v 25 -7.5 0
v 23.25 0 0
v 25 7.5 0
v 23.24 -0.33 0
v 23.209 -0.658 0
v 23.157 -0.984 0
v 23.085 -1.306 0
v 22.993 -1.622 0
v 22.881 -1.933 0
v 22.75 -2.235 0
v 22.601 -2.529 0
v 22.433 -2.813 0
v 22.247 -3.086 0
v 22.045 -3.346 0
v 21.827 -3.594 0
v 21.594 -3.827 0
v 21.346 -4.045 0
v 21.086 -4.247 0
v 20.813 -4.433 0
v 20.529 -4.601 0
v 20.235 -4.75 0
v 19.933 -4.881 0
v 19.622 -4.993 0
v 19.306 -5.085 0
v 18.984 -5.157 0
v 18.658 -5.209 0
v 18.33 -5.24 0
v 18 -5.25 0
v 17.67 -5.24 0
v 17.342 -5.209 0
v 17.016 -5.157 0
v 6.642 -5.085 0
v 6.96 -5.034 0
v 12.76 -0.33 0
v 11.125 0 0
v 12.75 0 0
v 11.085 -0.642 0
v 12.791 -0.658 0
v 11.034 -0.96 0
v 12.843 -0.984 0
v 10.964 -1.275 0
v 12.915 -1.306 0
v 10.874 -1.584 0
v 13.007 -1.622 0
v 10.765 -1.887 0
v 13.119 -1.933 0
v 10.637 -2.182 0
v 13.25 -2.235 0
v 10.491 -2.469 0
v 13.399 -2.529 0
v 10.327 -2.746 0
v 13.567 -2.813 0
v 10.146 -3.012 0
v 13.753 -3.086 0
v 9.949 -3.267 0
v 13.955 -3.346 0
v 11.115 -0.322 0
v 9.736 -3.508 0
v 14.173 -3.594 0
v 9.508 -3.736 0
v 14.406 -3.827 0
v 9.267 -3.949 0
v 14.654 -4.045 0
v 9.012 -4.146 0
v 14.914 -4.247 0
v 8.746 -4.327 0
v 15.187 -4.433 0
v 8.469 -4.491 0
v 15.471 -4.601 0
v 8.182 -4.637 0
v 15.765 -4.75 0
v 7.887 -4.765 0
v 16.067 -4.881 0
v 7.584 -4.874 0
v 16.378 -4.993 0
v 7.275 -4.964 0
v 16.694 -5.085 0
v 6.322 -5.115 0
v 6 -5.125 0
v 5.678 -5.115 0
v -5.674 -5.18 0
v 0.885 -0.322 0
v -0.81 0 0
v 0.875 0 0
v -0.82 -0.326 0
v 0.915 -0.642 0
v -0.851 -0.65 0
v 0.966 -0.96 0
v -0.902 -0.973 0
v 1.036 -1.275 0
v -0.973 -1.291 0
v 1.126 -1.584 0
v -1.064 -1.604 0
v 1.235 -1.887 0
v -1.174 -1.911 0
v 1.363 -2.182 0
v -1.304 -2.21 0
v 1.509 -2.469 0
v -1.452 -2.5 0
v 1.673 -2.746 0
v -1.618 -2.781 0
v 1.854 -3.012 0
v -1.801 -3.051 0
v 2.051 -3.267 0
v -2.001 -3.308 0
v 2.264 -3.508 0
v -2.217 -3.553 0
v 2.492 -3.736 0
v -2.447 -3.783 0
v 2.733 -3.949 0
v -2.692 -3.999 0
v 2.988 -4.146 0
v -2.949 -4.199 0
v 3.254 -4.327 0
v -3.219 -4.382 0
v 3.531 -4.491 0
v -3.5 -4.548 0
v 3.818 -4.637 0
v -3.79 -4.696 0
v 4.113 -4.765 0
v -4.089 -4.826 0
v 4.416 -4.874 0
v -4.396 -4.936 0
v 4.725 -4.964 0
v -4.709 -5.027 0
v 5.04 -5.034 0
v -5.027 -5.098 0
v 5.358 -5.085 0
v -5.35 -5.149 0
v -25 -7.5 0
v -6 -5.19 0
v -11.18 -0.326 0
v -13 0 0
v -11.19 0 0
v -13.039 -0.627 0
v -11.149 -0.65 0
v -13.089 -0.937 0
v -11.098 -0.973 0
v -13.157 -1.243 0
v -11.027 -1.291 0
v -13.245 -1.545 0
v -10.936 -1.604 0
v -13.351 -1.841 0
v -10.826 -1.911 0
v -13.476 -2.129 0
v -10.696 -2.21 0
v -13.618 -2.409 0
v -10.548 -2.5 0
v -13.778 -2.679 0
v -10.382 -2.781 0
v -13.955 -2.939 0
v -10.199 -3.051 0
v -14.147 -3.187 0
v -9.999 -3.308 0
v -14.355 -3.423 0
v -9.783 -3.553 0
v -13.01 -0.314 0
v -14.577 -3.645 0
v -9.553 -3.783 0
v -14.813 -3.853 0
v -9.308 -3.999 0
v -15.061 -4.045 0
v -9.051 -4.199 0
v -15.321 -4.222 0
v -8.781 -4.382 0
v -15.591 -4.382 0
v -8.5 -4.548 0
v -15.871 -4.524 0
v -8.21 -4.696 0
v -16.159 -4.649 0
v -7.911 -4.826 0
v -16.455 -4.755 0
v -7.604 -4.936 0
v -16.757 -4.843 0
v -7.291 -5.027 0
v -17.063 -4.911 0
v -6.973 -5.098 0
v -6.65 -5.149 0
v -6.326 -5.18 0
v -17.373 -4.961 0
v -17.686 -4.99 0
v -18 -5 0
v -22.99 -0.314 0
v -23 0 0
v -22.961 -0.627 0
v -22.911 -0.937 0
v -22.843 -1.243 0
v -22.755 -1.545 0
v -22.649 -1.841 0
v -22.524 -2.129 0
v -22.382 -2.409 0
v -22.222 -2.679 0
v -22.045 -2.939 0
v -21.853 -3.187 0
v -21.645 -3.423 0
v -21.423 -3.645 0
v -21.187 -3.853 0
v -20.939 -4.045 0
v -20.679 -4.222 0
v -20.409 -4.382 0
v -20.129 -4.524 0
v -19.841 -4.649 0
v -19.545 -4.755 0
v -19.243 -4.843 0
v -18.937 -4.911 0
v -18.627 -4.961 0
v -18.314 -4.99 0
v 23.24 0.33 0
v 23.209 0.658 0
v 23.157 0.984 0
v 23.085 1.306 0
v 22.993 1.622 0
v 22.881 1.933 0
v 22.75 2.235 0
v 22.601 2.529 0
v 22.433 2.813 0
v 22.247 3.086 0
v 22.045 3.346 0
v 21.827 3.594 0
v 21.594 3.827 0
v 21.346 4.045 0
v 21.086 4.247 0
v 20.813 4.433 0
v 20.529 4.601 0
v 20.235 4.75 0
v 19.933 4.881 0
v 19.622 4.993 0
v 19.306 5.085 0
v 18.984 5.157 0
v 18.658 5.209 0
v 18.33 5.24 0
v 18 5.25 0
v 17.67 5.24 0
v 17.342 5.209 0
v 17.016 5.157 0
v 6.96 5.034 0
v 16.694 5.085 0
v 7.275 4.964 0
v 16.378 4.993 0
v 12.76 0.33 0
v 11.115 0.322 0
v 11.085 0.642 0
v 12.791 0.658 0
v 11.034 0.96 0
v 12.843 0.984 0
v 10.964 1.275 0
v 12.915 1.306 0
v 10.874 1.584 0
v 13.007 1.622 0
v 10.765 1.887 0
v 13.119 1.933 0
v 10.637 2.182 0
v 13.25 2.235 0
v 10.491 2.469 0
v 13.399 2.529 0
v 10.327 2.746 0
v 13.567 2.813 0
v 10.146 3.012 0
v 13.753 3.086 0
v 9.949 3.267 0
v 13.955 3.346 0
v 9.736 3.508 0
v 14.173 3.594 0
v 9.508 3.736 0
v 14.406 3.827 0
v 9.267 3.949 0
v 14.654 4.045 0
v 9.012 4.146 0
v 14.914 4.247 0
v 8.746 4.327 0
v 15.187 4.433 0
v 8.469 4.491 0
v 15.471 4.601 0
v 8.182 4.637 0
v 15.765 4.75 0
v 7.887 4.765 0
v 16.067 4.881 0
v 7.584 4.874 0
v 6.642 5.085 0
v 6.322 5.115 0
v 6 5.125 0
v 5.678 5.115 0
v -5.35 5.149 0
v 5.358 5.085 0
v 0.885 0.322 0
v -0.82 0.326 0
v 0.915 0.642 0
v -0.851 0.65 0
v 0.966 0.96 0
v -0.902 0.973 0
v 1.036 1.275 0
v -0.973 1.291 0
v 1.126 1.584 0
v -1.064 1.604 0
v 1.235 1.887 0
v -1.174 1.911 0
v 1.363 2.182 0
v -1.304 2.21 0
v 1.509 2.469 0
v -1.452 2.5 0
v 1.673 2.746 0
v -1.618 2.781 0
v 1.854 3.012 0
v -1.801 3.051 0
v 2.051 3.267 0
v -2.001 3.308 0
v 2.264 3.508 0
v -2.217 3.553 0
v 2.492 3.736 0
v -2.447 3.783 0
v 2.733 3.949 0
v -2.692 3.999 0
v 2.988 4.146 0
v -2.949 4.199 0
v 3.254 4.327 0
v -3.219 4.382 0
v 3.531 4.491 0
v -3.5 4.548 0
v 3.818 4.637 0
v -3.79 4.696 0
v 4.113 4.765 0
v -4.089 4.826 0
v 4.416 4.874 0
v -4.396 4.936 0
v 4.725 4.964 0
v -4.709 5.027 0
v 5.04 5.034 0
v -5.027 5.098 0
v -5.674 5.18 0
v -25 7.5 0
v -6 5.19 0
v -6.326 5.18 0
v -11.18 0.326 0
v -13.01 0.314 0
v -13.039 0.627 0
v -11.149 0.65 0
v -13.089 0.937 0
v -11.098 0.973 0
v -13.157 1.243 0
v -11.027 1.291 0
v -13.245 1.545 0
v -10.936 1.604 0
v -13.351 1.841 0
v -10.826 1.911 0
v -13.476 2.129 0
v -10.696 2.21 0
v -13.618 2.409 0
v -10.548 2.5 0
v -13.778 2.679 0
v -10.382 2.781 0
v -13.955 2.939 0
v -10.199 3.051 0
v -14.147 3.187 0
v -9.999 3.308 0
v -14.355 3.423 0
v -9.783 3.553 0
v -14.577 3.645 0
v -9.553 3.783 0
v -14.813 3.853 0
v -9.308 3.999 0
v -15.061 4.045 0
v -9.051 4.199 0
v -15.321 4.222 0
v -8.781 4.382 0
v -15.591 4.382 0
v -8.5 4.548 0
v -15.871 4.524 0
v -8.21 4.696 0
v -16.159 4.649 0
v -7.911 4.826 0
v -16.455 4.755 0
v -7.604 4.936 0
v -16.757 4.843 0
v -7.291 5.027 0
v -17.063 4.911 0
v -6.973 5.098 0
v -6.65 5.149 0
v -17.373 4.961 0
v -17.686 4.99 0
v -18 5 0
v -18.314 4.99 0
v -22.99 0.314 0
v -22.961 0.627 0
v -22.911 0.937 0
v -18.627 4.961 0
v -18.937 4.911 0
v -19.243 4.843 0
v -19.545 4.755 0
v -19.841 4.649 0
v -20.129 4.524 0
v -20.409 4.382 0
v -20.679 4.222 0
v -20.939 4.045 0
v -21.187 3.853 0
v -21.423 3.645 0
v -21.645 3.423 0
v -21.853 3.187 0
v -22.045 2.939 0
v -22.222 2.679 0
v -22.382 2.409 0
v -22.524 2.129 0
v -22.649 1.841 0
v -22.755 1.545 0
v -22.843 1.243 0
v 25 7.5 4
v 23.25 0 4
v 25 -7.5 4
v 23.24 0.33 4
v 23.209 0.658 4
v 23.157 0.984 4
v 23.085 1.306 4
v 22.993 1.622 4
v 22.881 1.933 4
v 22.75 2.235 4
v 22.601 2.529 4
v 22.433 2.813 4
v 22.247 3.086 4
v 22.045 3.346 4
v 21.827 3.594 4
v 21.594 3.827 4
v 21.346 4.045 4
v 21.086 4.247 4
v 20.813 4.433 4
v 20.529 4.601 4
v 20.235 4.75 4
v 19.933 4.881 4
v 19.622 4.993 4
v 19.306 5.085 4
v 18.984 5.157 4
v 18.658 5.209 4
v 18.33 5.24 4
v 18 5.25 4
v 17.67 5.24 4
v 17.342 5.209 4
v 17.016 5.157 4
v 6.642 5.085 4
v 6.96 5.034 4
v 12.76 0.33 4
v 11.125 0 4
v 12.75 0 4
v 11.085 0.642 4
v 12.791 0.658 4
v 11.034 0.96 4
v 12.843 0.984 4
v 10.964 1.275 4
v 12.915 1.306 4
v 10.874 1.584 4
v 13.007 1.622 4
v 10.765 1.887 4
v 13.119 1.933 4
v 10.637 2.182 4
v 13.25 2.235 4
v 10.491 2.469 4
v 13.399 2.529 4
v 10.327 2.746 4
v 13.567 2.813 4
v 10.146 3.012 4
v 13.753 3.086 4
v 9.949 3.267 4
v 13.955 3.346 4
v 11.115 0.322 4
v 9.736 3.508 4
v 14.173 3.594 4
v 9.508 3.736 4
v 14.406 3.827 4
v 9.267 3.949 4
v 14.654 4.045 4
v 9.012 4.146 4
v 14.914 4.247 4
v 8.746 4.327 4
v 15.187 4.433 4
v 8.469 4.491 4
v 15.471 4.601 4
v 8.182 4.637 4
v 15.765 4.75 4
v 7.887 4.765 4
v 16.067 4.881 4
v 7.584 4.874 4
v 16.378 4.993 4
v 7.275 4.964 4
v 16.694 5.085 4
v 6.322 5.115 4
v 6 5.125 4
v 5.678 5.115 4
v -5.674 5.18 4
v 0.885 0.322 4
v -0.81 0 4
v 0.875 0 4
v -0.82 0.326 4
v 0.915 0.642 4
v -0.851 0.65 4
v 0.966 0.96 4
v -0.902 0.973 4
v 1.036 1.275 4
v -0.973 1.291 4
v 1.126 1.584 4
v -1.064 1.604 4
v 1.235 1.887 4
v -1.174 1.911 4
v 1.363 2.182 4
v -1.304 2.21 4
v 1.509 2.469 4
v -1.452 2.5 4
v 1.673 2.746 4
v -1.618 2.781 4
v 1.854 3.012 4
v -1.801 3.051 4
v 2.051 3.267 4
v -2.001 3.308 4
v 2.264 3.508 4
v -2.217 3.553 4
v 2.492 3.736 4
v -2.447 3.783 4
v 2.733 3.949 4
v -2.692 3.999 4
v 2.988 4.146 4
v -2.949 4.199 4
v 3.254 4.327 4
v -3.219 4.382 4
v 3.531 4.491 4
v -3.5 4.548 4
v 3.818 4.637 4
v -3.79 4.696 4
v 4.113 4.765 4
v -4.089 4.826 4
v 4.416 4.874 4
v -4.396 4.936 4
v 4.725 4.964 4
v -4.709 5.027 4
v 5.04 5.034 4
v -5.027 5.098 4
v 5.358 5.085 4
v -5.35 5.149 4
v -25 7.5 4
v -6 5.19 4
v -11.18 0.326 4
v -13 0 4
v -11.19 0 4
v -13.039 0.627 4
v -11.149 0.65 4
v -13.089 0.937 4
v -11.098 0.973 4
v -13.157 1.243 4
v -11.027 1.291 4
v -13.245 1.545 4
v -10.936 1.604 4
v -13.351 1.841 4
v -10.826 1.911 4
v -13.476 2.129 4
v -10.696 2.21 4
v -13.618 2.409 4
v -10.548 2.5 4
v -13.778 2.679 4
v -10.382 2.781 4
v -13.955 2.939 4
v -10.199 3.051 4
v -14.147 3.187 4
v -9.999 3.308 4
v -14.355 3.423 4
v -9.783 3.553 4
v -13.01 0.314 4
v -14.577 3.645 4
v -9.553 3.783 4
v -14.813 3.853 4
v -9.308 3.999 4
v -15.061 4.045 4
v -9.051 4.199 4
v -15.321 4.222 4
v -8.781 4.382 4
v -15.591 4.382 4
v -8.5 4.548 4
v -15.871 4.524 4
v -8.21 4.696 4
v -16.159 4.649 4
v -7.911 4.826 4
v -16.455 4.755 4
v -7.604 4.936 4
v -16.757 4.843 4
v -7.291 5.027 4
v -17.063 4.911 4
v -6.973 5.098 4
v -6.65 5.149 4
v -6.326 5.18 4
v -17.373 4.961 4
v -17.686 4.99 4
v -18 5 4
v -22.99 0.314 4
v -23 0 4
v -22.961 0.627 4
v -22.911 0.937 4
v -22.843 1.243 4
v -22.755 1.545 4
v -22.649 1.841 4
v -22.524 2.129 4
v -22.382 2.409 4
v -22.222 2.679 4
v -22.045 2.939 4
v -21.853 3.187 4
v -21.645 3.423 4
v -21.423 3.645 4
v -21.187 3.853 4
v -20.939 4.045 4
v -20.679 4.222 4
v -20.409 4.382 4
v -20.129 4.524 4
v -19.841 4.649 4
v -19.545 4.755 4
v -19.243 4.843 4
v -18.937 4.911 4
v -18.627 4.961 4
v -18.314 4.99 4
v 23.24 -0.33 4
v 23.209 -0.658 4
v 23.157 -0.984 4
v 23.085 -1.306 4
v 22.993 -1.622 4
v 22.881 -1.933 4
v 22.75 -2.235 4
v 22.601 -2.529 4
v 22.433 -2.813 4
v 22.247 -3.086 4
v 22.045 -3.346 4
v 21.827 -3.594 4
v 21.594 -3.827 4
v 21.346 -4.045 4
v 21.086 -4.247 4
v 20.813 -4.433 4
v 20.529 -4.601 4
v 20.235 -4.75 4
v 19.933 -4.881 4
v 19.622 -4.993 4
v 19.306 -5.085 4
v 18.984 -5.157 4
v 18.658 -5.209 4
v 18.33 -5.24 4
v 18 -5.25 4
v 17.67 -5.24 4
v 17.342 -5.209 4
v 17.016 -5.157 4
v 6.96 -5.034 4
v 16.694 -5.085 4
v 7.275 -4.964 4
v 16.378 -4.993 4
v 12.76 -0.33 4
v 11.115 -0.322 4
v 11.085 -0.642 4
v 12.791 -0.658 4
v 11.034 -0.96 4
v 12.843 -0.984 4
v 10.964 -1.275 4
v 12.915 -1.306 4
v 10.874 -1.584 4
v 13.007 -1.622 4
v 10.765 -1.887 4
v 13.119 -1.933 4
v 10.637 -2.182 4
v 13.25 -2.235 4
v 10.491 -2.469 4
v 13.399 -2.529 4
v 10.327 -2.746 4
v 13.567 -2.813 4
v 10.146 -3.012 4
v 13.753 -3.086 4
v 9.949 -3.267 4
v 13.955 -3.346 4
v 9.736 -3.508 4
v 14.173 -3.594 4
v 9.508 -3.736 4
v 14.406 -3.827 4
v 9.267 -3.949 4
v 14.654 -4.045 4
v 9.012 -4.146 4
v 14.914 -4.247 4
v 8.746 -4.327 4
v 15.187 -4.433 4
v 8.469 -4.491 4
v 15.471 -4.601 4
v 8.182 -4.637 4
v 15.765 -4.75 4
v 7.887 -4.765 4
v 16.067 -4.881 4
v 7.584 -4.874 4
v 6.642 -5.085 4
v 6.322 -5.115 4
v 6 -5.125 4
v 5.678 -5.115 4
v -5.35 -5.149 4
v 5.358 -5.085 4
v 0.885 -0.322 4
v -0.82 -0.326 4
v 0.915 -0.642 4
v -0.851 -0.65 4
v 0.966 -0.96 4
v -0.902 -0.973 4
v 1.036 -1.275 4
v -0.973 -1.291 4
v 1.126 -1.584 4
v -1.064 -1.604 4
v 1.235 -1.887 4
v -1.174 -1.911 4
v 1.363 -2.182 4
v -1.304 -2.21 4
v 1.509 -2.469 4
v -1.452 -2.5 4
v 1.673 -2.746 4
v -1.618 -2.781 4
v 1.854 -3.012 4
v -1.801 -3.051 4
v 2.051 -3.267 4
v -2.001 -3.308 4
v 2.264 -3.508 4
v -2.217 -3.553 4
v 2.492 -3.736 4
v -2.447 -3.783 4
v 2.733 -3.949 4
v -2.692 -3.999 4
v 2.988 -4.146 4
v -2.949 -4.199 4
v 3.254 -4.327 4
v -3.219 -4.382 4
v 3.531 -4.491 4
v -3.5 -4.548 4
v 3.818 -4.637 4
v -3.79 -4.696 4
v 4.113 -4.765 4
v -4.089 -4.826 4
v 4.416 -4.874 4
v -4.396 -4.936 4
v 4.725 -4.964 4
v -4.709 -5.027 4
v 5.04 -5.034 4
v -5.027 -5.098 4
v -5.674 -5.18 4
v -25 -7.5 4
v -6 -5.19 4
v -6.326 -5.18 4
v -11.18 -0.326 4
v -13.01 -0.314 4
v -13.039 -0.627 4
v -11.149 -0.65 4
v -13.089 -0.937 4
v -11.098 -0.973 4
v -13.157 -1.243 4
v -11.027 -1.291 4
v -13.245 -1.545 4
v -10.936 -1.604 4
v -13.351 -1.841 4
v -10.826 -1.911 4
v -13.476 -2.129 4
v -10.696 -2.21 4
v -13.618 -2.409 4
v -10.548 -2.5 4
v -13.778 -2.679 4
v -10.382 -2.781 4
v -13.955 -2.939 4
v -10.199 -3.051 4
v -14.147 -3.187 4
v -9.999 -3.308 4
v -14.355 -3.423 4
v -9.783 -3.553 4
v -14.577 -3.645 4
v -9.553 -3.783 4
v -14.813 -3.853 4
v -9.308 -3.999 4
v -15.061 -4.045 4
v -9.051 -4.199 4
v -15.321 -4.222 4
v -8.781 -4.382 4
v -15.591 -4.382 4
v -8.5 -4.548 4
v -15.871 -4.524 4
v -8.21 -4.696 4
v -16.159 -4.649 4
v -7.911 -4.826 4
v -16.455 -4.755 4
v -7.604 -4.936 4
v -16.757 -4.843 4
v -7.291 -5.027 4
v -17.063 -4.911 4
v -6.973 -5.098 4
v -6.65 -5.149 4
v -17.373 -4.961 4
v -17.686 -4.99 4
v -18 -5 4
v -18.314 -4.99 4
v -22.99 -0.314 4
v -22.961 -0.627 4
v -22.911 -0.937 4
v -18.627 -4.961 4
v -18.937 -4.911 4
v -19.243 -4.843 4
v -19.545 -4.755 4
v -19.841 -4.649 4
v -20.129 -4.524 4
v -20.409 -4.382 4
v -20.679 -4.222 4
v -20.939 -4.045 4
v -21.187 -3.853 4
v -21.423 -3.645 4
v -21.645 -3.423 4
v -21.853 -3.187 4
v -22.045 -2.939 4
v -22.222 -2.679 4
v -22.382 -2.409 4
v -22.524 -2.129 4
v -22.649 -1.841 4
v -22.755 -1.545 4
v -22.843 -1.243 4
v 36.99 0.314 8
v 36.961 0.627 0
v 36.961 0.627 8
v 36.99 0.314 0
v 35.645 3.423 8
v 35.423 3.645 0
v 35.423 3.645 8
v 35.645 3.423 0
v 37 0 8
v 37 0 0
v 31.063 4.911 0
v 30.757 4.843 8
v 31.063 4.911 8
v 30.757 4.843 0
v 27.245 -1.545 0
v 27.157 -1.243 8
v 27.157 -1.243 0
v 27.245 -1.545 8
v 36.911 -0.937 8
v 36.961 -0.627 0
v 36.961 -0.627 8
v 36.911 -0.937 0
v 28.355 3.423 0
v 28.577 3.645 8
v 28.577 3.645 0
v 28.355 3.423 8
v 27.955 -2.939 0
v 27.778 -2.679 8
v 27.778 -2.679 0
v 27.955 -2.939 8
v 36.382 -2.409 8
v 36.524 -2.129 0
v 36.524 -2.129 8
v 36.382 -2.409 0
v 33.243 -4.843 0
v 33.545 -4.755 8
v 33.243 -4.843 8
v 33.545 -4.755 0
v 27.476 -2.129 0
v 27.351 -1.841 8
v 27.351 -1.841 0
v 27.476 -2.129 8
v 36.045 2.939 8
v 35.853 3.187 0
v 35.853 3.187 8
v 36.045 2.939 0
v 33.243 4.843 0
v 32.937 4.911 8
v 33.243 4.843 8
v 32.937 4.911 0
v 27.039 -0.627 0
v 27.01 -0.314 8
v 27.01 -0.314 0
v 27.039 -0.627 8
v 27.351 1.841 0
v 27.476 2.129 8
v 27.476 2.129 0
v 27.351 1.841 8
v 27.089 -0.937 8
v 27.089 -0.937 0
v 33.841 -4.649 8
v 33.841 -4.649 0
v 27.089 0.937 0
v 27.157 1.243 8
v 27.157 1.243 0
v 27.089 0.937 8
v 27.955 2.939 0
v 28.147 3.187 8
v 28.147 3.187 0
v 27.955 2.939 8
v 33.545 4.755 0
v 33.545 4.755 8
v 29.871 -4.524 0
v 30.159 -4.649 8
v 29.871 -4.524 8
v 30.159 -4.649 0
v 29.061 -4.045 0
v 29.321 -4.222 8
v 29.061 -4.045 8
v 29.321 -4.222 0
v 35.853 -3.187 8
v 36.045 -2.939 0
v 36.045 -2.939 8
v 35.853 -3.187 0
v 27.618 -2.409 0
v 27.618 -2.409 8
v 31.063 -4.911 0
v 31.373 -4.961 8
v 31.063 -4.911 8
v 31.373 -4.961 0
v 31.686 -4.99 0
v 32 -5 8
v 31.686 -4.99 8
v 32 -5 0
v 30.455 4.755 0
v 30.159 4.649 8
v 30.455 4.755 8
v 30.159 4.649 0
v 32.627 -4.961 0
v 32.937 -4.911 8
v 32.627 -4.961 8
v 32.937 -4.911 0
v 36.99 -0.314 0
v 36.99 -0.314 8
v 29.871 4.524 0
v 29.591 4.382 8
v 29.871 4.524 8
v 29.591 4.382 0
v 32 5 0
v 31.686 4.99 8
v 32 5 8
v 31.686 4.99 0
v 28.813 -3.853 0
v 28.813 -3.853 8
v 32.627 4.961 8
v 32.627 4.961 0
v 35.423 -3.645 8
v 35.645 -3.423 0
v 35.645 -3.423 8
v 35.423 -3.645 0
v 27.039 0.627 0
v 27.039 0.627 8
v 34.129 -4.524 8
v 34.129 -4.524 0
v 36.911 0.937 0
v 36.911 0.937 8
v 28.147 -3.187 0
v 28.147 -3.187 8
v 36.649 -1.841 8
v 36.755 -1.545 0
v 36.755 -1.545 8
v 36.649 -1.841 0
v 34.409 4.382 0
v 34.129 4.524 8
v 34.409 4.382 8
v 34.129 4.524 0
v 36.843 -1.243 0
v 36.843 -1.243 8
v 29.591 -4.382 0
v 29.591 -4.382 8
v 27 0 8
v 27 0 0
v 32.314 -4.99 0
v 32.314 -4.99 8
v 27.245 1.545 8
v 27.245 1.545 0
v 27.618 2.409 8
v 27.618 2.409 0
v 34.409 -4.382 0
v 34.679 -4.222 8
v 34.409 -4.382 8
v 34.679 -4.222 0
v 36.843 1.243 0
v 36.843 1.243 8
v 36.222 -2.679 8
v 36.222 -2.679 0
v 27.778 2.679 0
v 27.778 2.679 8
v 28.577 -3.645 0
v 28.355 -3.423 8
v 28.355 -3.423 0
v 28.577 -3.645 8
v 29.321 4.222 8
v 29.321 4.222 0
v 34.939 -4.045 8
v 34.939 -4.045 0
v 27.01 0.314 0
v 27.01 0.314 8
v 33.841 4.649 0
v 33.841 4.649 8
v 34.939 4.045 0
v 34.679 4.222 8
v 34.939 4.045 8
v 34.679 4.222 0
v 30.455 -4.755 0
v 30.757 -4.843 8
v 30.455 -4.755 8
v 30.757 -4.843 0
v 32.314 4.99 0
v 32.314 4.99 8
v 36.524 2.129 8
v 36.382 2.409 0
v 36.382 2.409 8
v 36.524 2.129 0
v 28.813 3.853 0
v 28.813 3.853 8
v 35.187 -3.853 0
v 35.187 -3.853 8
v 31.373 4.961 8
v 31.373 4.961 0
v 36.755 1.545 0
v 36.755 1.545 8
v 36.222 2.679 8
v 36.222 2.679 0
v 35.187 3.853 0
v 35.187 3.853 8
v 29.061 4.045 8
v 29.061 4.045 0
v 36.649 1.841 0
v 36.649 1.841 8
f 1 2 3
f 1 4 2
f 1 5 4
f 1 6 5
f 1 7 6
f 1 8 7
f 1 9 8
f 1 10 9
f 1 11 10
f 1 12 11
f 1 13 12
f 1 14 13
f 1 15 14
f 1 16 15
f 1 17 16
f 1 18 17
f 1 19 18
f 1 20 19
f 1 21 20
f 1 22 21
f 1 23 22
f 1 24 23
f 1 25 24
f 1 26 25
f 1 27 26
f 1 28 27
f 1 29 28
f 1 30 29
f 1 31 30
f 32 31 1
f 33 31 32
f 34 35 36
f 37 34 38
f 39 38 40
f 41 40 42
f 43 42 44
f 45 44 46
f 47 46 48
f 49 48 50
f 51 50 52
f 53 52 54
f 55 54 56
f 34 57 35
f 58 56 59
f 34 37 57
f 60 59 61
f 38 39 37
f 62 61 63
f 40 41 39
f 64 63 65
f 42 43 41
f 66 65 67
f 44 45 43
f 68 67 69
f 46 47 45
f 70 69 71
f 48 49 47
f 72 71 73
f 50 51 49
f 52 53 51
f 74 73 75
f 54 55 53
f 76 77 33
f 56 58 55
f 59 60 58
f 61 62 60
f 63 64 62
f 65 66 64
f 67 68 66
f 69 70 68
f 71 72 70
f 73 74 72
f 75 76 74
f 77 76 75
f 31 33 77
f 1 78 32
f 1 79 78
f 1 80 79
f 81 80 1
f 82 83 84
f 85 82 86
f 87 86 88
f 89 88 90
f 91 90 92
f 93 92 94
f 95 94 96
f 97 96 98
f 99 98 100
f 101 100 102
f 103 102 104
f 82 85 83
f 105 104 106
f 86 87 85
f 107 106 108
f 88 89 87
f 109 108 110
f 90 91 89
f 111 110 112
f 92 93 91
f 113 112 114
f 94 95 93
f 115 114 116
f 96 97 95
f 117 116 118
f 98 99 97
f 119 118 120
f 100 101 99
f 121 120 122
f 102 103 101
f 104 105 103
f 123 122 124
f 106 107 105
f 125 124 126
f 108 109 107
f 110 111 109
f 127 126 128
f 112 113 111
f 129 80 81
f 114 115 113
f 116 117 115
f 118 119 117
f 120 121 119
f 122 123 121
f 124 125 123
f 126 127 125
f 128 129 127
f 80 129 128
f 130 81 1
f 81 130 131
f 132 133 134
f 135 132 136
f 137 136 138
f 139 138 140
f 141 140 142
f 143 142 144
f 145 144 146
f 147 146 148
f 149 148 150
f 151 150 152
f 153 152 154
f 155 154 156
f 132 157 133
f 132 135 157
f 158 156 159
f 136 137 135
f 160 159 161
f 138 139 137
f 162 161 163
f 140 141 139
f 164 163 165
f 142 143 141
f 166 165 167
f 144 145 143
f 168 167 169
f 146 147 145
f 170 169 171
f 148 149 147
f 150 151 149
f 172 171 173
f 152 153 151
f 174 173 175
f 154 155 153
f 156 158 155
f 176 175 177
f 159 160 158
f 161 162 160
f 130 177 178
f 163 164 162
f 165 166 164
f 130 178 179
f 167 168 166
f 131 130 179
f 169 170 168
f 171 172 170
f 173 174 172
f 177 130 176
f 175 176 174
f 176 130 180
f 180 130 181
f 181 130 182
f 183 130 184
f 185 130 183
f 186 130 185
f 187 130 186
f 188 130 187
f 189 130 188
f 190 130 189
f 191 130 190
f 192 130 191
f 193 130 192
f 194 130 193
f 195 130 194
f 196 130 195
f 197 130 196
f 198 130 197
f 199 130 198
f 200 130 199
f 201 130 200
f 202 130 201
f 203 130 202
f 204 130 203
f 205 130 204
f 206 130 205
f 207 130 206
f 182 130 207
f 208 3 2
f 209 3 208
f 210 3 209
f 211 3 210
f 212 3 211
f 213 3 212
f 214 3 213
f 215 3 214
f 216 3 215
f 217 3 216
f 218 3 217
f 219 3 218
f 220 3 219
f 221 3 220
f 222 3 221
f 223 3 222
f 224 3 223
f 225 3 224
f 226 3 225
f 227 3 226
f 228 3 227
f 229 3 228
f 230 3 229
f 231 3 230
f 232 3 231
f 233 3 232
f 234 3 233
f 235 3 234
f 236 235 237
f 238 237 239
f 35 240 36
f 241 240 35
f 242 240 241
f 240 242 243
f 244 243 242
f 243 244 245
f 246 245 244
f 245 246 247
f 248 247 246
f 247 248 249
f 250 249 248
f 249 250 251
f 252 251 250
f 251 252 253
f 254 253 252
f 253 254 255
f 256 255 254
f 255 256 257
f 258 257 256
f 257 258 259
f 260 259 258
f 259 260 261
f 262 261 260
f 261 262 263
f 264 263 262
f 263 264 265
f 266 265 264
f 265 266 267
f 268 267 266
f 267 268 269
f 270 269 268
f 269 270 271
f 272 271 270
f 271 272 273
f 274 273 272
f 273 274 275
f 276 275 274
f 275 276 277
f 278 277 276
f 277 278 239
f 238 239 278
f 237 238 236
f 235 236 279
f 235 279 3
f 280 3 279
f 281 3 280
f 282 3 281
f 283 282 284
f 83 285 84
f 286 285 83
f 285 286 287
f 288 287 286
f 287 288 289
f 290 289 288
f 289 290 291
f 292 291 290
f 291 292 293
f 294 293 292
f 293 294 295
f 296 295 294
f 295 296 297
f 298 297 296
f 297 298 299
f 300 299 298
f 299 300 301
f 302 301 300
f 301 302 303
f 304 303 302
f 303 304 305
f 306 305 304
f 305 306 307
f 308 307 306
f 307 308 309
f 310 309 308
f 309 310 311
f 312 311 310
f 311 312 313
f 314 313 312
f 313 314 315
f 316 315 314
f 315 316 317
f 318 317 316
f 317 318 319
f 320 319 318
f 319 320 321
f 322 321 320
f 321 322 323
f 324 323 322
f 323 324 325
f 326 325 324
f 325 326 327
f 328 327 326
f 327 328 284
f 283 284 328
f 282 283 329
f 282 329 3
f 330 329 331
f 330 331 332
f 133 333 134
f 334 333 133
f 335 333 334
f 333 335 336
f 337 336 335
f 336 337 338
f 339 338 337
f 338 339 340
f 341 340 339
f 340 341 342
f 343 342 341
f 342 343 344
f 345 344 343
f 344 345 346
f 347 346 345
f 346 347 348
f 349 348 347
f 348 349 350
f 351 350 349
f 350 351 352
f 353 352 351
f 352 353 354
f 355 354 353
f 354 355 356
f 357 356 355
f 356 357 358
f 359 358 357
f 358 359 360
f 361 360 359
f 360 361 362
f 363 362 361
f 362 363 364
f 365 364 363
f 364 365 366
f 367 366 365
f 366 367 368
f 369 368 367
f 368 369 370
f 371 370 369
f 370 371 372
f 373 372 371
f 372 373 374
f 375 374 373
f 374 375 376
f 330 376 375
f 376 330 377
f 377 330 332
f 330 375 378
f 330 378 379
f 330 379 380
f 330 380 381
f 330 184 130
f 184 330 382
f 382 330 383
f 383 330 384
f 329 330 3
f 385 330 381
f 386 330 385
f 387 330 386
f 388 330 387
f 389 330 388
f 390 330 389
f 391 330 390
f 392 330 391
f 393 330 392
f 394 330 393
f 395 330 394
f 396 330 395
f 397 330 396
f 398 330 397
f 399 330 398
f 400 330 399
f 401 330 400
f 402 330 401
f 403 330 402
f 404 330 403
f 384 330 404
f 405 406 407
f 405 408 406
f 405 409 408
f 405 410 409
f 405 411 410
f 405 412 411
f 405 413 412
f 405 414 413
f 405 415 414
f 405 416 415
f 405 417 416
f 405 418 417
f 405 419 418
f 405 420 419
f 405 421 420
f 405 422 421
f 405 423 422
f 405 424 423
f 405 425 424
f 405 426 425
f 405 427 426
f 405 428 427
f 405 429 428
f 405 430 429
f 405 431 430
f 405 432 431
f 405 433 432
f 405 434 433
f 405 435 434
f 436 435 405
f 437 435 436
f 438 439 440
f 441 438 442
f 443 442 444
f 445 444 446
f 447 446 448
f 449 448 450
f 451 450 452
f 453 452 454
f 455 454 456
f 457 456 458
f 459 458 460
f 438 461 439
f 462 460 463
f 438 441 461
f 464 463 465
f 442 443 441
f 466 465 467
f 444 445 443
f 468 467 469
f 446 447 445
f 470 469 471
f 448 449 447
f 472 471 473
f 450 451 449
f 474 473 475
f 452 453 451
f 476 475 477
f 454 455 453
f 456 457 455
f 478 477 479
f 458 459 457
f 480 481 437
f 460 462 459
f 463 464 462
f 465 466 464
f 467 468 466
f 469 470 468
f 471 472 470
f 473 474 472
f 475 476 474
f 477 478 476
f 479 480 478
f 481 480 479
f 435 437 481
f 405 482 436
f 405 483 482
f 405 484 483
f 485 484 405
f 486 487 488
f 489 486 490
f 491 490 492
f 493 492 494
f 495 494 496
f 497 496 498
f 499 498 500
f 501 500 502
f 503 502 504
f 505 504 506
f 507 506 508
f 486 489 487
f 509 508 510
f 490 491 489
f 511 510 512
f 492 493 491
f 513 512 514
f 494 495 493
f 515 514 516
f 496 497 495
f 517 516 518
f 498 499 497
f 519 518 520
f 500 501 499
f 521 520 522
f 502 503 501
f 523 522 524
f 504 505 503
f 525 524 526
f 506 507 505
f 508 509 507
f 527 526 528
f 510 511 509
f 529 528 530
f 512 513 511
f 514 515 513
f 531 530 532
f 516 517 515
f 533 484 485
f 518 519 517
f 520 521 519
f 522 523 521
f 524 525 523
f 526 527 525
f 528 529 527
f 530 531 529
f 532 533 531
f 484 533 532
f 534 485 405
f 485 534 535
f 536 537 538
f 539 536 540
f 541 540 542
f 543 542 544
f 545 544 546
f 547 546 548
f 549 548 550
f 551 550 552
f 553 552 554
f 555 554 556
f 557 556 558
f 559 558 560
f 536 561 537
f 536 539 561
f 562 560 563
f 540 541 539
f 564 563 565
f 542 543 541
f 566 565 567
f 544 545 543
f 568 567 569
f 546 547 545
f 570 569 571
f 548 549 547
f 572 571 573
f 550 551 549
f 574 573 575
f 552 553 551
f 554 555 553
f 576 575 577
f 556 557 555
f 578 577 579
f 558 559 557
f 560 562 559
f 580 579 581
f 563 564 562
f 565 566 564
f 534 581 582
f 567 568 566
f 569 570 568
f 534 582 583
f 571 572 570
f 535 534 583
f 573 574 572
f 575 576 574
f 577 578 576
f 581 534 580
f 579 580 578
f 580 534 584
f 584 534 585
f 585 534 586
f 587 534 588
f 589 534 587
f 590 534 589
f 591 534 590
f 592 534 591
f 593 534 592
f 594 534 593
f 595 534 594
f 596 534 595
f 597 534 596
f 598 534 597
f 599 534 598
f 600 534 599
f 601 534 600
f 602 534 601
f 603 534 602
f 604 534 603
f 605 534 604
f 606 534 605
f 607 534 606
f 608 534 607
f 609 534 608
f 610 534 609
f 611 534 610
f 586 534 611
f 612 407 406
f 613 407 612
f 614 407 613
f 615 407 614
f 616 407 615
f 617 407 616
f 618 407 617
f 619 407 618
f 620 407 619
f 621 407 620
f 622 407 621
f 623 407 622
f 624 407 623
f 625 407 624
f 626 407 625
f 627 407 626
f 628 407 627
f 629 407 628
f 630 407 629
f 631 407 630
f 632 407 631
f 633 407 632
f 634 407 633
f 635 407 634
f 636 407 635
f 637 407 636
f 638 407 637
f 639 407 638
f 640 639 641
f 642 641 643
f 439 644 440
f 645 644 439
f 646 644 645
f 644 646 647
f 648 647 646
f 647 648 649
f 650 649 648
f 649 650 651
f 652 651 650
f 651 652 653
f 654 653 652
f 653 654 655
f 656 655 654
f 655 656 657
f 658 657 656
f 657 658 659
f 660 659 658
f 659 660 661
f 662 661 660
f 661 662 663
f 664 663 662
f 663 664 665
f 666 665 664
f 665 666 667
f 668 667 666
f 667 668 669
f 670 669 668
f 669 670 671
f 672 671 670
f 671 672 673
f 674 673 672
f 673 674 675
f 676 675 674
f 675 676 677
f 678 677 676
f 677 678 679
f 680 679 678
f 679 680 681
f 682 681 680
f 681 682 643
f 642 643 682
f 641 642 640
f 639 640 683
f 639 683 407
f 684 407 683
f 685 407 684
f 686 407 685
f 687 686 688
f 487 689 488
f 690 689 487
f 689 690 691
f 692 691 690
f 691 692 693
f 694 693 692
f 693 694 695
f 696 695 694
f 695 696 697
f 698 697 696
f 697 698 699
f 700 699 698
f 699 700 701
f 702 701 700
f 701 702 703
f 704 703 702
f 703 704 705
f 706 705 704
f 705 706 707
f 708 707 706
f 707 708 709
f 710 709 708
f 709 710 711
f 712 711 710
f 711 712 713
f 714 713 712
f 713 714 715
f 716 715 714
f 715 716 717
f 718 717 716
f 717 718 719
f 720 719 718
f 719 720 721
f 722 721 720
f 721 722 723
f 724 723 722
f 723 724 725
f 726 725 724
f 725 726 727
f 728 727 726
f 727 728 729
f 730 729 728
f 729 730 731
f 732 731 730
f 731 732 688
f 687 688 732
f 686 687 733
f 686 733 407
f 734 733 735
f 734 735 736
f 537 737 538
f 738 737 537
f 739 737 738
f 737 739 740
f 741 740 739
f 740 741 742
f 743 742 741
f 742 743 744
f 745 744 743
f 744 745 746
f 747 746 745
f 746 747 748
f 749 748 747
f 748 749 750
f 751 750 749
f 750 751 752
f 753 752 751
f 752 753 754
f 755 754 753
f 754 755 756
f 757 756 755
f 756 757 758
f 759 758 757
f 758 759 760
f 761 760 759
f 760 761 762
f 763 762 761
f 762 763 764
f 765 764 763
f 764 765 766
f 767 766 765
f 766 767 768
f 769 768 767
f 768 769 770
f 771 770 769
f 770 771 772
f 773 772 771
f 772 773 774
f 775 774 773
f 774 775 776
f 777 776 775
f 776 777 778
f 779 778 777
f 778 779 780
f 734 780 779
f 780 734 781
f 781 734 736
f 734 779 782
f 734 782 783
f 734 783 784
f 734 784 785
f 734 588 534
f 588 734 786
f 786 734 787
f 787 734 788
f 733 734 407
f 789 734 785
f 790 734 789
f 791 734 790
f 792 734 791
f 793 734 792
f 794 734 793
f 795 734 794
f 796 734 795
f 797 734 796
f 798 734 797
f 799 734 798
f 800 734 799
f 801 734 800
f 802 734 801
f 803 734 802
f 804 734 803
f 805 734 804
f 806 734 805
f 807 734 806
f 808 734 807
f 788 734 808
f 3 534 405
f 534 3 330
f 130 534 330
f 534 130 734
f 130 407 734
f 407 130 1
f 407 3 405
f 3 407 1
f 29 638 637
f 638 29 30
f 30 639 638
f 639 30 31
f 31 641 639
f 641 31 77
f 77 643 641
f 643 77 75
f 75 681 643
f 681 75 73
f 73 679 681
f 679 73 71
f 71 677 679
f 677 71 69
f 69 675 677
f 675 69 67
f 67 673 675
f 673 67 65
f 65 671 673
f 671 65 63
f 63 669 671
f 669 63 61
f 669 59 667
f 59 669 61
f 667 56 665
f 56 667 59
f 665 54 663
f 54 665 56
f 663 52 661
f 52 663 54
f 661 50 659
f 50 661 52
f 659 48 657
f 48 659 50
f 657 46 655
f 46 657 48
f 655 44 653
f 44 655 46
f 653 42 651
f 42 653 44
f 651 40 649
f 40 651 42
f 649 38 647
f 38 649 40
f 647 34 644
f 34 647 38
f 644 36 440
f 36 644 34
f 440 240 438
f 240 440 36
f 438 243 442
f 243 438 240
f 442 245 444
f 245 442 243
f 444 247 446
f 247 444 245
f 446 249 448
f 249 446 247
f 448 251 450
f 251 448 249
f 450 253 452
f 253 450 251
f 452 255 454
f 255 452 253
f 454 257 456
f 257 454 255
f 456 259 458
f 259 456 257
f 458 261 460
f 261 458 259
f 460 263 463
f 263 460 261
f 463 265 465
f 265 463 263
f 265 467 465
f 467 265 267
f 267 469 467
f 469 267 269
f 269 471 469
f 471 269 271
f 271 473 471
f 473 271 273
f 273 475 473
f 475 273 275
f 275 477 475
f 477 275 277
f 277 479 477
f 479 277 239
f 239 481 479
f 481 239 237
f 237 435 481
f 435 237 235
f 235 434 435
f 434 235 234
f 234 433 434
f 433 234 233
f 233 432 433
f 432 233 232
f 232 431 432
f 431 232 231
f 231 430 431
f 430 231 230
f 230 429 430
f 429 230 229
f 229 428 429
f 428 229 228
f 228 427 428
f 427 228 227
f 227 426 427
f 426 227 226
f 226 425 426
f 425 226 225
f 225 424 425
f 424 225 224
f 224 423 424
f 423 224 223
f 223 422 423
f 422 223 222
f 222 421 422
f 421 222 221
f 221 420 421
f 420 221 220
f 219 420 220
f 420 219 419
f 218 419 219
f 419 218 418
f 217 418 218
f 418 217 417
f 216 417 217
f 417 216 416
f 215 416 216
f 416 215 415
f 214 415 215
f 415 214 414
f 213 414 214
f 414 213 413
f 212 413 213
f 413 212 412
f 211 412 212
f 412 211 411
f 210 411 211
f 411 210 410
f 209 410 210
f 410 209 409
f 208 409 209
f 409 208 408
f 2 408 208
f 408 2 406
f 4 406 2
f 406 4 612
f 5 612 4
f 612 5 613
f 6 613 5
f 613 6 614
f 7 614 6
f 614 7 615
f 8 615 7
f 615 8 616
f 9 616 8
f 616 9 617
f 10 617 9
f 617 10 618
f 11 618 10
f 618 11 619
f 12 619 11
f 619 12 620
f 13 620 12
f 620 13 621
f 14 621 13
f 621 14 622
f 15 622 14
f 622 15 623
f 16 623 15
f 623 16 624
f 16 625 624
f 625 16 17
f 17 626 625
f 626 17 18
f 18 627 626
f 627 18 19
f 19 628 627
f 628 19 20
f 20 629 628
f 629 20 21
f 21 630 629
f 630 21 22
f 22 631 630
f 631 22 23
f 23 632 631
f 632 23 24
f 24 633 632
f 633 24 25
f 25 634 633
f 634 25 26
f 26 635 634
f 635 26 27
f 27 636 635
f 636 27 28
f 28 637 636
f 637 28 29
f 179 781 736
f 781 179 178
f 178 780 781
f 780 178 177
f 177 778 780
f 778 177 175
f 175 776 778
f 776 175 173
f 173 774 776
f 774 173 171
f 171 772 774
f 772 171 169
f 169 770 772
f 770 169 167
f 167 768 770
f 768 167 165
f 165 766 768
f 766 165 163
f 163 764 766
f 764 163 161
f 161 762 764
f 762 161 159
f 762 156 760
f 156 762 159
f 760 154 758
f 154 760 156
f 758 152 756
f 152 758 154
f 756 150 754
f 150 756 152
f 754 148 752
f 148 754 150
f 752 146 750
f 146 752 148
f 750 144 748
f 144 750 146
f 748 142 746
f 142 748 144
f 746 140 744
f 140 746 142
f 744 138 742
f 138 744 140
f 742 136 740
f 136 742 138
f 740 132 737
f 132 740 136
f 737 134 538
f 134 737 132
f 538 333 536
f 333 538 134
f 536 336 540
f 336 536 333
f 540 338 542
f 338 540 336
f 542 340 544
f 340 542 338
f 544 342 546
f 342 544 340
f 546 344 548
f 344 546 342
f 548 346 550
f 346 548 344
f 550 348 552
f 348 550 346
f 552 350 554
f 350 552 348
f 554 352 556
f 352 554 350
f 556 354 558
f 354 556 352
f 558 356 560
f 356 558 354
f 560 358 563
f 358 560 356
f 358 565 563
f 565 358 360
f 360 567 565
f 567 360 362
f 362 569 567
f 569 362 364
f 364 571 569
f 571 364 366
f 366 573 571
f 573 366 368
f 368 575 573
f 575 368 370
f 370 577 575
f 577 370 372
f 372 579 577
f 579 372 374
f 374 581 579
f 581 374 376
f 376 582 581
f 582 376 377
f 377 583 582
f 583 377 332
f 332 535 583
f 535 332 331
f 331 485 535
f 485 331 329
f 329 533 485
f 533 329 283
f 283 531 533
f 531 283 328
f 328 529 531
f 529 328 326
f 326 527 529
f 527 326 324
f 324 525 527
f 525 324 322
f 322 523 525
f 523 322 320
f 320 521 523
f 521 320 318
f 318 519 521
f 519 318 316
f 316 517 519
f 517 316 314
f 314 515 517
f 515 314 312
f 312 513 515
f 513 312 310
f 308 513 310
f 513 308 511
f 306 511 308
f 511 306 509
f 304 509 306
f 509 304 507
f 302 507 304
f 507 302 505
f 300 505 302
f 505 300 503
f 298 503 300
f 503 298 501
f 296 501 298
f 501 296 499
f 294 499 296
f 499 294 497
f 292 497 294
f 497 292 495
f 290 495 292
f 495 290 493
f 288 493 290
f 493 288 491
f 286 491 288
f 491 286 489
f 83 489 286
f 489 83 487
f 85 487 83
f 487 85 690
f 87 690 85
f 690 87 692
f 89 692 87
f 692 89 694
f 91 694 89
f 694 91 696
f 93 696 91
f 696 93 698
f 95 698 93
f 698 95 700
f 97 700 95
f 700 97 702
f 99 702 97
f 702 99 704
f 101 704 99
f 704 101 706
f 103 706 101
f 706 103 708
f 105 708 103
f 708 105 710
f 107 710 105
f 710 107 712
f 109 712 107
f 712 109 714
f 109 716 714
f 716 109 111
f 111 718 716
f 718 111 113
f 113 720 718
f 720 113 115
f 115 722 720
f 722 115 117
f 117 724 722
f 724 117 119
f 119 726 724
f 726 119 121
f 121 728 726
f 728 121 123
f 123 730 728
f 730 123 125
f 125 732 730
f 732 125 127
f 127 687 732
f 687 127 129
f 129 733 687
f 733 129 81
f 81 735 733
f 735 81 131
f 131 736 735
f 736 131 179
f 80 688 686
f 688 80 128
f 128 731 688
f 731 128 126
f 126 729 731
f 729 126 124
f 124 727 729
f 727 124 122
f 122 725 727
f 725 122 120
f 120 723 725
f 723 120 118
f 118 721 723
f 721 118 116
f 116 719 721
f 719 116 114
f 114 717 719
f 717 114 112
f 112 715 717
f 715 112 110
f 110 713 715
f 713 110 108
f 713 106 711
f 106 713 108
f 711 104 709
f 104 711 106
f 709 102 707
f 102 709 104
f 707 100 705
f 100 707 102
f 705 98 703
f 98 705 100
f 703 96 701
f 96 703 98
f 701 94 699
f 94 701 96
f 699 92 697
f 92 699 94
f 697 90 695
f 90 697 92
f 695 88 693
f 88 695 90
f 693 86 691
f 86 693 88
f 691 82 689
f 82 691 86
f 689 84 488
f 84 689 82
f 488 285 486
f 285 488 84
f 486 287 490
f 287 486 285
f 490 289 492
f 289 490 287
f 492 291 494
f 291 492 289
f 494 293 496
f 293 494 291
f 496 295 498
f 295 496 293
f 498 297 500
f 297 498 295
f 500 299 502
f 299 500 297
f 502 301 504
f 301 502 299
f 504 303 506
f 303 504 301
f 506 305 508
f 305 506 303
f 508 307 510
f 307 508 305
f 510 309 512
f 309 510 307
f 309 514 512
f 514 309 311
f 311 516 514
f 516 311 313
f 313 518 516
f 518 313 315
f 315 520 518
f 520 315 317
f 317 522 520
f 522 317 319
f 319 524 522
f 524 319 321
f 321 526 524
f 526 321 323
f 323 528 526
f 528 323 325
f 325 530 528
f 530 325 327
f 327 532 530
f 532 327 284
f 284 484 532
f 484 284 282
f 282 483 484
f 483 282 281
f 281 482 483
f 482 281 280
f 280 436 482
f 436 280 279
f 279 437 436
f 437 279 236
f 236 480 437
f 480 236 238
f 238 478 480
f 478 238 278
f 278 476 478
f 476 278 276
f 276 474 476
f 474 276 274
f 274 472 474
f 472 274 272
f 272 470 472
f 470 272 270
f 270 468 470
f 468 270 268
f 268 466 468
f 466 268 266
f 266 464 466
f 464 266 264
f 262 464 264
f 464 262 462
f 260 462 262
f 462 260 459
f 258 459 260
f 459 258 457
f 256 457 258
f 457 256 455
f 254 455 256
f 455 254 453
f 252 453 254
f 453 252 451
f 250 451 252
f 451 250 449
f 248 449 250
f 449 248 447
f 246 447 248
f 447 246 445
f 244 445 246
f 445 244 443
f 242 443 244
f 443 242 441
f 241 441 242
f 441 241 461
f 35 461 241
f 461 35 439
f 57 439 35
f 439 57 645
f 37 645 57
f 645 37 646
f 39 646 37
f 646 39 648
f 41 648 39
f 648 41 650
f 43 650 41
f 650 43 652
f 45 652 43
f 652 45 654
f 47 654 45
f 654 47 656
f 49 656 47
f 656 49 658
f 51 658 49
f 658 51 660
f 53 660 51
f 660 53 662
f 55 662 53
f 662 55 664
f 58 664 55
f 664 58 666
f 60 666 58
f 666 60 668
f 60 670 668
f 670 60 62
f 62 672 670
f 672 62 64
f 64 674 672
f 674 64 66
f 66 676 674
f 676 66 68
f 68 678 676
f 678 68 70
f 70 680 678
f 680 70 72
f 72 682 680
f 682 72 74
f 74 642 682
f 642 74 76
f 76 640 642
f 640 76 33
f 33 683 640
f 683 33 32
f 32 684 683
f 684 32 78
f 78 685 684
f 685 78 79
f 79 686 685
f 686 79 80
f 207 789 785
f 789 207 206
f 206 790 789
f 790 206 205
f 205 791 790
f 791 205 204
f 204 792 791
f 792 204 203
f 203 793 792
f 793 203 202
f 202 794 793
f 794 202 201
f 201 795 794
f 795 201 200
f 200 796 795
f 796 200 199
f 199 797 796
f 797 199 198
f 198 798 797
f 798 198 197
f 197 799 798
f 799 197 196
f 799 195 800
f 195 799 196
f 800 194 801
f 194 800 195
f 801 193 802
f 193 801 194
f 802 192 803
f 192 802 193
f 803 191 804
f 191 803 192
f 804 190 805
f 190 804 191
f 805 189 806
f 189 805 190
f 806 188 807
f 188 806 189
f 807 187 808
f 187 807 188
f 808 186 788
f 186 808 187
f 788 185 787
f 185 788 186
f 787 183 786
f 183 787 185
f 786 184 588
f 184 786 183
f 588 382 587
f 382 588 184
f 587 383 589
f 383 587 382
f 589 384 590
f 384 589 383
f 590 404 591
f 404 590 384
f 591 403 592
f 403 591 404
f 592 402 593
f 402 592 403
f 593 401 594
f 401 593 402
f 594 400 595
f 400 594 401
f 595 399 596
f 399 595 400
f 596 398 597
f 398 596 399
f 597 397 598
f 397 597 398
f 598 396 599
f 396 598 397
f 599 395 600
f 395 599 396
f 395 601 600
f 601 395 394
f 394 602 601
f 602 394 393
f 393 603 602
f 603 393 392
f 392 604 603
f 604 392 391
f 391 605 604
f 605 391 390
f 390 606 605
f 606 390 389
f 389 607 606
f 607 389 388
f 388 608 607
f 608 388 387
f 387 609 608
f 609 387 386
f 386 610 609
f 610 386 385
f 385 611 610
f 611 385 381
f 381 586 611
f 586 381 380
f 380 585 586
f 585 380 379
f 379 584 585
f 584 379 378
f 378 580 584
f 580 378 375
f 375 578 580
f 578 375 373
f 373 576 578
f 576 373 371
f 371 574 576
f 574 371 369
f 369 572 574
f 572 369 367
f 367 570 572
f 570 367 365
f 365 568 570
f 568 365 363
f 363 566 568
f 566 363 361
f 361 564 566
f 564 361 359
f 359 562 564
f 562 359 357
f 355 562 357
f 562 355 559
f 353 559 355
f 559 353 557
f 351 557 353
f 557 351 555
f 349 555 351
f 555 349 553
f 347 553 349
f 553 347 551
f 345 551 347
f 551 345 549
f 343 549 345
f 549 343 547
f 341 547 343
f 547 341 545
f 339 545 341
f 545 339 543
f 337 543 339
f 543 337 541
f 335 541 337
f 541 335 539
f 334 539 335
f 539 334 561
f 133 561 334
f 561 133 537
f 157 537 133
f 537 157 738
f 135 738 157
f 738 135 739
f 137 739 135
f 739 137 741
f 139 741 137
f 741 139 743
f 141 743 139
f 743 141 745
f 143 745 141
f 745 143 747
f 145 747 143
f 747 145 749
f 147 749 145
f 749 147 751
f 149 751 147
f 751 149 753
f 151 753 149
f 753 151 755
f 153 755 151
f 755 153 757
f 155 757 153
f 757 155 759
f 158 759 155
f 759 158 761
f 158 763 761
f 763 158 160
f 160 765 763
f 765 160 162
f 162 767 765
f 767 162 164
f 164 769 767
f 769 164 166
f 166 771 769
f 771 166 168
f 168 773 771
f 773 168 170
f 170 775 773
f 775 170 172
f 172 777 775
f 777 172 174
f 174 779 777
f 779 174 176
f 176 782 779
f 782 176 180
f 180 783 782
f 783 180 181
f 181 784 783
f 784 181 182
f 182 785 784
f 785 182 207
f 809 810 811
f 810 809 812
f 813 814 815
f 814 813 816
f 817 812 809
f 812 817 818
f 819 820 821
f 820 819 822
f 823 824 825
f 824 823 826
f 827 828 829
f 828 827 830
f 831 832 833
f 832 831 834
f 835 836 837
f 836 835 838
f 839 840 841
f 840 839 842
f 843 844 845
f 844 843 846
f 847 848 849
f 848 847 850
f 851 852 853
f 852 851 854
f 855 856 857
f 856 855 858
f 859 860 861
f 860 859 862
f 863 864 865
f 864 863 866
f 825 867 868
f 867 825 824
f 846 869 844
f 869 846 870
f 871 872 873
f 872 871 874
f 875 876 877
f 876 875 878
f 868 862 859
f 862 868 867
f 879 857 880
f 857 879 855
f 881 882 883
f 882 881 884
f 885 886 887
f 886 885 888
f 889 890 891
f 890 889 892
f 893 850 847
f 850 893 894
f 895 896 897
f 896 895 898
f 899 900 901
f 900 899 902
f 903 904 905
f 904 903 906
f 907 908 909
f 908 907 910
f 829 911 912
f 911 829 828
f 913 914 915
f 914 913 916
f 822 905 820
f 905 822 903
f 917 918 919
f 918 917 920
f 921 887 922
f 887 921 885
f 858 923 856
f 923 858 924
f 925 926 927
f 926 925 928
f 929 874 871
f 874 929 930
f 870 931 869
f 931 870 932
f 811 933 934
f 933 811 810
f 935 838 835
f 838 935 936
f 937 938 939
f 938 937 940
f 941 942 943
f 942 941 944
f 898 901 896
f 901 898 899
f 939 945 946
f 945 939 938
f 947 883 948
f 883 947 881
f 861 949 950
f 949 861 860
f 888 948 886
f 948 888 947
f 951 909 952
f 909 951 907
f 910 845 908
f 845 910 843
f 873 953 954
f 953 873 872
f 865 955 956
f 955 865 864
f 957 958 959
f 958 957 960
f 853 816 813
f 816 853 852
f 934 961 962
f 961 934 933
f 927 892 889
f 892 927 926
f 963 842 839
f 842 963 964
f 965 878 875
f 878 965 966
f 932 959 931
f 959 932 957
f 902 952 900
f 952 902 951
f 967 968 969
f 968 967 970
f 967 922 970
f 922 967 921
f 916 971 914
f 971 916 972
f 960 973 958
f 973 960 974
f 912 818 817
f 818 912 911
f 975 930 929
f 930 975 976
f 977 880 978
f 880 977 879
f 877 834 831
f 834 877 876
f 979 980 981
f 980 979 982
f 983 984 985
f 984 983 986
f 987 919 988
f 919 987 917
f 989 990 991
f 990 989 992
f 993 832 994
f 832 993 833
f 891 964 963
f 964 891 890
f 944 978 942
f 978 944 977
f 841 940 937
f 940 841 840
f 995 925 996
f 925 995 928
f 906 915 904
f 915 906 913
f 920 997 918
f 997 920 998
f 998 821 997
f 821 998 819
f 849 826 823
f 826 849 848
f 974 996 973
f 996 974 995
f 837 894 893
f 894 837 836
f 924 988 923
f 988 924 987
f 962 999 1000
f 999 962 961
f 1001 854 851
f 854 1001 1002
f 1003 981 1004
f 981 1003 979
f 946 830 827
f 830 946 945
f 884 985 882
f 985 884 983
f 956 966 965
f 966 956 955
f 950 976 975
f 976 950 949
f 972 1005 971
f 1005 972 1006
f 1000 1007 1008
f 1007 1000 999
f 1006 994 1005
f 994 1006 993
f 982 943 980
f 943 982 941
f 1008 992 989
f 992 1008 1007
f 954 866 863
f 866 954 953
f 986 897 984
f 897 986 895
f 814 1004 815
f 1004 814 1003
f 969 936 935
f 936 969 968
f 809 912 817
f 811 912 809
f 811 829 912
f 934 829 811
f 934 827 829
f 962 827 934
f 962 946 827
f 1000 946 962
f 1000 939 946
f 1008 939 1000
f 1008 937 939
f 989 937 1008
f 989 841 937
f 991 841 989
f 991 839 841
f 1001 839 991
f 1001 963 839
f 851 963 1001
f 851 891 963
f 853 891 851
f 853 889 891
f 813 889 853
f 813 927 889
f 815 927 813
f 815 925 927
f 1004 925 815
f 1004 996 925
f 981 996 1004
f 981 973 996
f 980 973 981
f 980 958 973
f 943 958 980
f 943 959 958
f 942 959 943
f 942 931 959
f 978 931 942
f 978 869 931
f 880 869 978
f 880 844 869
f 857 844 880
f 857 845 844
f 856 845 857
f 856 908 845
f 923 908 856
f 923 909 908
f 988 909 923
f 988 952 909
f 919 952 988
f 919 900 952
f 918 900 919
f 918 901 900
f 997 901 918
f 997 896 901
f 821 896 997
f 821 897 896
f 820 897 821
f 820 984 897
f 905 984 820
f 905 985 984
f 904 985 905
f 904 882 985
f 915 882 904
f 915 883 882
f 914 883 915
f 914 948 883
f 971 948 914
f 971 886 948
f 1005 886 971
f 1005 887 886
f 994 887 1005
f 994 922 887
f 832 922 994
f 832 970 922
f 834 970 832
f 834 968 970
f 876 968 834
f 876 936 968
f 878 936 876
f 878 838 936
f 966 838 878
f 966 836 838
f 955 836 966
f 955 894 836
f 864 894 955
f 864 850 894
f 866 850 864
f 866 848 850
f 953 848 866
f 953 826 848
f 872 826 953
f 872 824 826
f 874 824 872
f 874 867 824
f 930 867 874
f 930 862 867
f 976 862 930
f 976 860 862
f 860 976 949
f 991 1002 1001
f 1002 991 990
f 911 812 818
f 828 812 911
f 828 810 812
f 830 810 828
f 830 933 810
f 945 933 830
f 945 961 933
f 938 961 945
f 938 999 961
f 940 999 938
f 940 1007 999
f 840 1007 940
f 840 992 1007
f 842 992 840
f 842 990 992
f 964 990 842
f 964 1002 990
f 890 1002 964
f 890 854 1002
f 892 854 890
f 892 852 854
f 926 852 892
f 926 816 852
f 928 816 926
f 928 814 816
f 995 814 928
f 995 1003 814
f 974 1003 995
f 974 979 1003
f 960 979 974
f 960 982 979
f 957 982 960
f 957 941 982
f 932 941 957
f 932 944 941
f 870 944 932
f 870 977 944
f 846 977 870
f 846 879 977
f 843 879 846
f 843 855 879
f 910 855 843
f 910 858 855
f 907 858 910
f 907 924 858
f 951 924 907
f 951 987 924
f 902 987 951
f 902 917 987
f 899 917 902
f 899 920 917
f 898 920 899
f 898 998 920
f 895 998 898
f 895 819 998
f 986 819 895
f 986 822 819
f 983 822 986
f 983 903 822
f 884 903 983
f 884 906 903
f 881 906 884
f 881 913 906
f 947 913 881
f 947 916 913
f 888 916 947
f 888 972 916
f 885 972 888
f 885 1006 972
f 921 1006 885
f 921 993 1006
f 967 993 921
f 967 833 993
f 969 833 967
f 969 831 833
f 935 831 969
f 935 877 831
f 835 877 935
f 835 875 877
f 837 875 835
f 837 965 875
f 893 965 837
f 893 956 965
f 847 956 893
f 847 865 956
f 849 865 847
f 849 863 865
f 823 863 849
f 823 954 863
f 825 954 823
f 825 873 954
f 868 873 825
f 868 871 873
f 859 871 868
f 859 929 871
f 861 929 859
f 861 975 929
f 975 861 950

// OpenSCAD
//0.38 mm for Tighter Fit
//0.25 mm for press fit
//0.5 mm for easy fit
$fn=100;
linear_extrude( height= 4)
{
    difference()
    {
        square([50,15],center=true);

        translate([-18,0,0])
        circle( r = 5);

        translate([-6,0,0])
        circle( r = 5 + (0.38) / 2);

        translate([6,0,0])
        circle( r = 5 + (0.25 / 2));

        translate([18,0,0])
        circle( r = 5 + (0.5 / 2));
    }
}

linear_extrude(height=8)
translate([32,0,0])
circle(r=5);
